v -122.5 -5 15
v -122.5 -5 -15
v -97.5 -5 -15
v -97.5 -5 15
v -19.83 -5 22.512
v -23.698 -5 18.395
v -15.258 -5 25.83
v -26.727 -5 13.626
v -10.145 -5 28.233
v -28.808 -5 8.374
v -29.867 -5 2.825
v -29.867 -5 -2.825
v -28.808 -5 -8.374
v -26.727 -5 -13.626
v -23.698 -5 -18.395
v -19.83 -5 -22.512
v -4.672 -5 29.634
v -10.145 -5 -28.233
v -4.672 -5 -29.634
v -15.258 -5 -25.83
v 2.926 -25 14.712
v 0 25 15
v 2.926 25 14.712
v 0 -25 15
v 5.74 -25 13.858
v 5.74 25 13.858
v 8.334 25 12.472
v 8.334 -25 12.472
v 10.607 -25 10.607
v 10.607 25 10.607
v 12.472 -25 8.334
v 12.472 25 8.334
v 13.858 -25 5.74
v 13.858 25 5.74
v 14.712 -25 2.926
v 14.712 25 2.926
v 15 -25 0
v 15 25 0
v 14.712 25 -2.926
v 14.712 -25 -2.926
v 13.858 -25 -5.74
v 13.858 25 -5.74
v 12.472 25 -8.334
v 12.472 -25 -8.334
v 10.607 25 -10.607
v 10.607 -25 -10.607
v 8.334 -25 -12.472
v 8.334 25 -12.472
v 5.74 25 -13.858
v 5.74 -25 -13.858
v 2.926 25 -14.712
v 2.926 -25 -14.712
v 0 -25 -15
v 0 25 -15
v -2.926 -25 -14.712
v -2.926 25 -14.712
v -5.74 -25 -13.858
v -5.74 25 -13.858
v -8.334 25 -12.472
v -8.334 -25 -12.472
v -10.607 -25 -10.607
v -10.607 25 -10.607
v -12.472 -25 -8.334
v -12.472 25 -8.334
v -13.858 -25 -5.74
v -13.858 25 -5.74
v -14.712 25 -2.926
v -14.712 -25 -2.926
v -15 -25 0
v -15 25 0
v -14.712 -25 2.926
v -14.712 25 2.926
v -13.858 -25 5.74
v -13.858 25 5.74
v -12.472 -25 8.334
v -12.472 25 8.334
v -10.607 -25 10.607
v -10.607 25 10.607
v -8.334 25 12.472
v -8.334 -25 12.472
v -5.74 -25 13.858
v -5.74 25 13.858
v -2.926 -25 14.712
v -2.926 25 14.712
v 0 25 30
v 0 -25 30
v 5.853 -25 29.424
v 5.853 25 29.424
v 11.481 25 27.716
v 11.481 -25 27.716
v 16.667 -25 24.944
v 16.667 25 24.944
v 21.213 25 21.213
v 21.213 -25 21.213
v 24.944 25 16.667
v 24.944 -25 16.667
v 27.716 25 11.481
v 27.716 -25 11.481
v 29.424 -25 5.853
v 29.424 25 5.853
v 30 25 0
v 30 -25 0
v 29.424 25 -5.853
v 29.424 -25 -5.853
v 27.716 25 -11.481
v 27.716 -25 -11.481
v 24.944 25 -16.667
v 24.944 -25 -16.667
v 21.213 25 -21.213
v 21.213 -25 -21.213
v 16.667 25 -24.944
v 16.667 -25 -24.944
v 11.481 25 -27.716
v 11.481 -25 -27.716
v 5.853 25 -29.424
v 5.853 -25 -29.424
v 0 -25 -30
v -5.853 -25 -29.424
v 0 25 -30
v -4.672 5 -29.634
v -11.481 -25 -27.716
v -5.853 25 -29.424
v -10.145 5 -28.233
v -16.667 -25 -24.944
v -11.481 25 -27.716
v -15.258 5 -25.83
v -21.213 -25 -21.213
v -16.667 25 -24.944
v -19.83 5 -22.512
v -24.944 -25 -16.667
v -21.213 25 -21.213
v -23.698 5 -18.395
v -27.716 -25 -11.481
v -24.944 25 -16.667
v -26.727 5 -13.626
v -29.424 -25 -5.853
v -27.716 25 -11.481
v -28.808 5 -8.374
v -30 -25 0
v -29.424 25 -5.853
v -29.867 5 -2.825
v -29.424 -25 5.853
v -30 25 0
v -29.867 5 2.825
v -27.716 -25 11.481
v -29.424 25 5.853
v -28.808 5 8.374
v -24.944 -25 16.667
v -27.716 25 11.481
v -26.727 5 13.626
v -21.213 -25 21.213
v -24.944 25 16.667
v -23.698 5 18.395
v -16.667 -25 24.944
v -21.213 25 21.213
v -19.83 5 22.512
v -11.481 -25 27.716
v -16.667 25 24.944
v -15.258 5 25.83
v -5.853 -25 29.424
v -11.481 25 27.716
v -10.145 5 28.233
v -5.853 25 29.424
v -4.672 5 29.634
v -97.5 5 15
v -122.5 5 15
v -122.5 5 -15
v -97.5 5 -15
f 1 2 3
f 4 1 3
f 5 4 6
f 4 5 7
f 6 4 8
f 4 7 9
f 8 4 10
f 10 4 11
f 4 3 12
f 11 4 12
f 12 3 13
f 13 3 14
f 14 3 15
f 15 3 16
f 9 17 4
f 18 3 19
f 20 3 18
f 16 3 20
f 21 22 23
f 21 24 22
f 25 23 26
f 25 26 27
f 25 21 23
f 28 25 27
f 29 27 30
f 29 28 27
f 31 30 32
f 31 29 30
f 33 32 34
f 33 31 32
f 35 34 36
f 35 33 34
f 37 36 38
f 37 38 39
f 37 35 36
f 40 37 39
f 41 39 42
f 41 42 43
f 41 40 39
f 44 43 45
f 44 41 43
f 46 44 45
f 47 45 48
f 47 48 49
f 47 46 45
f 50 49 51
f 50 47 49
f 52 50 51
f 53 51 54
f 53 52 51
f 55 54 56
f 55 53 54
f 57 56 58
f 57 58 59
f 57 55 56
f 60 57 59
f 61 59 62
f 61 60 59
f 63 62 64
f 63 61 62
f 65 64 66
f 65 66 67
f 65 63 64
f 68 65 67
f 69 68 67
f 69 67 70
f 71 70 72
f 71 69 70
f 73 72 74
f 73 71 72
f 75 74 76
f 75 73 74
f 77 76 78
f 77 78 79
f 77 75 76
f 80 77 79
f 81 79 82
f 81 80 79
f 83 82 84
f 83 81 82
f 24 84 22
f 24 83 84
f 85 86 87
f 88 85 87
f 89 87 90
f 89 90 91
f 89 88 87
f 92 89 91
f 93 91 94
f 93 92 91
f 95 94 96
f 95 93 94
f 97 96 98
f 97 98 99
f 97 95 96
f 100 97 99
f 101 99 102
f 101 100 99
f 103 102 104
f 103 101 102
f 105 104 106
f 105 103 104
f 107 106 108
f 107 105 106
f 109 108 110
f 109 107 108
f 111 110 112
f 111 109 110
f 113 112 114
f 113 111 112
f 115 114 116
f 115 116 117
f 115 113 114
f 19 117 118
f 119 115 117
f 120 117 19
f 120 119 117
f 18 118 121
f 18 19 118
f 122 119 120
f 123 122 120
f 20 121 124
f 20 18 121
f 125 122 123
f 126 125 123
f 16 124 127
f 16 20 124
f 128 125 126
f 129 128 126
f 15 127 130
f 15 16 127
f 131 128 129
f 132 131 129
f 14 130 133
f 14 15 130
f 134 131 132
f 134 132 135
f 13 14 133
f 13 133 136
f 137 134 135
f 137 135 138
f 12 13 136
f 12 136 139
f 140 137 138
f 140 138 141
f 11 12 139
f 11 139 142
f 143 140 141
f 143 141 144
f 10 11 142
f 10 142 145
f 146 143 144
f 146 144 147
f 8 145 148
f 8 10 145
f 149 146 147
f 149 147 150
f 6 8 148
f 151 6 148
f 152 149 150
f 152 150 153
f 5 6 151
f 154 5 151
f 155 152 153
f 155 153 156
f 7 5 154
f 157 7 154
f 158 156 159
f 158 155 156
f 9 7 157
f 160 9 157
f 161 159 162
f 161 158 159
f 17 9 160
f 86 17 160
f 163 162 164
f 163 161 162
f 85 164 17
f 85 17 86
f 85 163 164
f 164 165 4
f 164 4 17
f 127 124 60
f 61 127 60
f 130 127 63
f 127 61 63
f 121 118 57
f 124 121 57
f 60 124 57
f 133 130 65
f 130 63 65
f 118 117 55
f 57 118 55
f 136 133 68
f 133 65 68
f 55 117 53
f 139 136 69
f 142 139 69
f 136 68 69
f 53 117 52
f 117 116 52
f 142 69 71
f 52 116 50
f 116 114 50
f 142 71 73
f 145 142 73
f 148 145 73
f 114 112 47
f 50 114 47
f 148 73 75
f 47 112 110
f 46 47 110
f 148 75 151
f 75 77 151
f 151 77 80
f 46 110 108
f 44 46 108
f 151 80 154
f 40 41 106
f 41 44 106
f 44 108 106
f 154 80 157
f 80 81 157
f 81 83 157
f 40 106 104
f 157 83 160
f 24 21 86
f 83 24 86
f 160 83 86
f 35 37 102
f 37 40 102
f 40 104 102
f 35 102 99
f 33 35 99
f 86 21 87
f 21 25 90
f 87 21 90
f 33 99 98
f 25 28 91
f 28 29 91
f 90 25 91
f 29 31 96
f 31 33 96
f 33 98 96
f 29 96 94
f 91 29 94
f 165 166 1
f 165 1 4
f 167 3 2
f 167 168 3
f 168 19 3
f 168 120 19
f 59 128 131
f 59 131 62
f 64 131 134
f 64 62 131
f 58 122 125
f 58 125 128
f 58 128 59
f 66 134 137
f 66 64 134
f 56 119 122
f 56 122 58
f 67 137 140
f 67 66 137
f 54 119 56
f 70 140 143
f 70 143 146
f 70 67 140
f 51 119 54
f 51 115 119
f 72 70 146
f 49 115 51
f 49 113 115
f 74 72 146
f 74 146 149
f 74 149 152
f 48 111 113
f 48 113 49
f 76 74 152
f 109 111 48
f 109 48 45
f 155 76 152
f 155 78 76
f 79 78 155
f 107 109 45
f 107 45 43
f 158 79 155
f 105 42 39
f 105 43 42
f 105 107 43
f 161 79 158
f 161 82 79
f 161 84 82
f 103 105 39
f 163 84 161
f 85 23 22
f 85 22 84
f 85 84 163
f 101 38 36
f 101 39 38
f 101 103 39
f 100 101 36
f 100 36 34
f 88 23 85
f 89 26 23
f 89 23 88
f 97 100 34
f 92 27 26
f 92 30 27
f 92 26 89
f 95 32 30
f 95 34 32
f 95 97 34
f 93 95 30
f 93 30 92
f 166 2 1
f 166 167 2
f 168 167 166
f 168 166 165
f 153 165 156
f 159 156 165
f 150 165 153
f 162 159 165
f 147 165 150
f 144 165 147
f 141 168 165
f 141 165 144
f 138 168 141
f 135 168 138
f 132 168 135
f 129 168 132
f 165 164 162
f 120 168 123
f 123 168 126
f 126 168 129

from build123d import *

# Parameters (mm, degrees)
SKETCH1_R           = 30
SKETCH1_R_2         = 15
BOSS_EXTRUDE1_DEPTH = 25
BOSS_EXTRUDE2_DEPTH = 5


with BuildPart() as part:
    # Sketch1 → Boss-Extrude1 (new body, symmetric)
    with BuildSketch(Plane(origin=(0, 0, 0), x_dir=(1, 0, 0), z_dir=(0, 1, 0))):
        with Locations(Location((0, 0, 0), (0, 0, 270))):  # turned: the seam where the file's is
            Circle(SKETCH1_R)
        with Locations(Location((0, 0, 0), (0, 0, 270))):  # turned: the seam where the file's is
            Circle(SKETCH1_R_2, mode=Mode.SUBTRACT)
    extrude(amount=BOSS_EXTRUDE1_DEPTH, both=True)

    # Sketch2 → Boss-Extrude2 (add, symmetric)
    with BuildSketch(Plane(origin=(0, 0, 0), x_dir=(1, 0, 0), z_dir=(0, 1, 0))):
        with BuildLine():
            Line((-122.5, 15), (-122.5, -15))
            Line((-122.5, -15), (-97.5, -15))
            Line((-97.5, -15), (-4.671688756, -29.634023084))
            ThreePointArc((-4.671688756, -29.634023084), (-30, 0), (-4.671688756, 29.634023084))
            Line((-4.671688756, 29.634023084), (-97.5, 15))
            Line((-97.5, 15), (-122.5, 15))
        make_face()
    extrude(amount=BOSS_EXTRUDE2_DEPTH, both=True)


solid = part.part
